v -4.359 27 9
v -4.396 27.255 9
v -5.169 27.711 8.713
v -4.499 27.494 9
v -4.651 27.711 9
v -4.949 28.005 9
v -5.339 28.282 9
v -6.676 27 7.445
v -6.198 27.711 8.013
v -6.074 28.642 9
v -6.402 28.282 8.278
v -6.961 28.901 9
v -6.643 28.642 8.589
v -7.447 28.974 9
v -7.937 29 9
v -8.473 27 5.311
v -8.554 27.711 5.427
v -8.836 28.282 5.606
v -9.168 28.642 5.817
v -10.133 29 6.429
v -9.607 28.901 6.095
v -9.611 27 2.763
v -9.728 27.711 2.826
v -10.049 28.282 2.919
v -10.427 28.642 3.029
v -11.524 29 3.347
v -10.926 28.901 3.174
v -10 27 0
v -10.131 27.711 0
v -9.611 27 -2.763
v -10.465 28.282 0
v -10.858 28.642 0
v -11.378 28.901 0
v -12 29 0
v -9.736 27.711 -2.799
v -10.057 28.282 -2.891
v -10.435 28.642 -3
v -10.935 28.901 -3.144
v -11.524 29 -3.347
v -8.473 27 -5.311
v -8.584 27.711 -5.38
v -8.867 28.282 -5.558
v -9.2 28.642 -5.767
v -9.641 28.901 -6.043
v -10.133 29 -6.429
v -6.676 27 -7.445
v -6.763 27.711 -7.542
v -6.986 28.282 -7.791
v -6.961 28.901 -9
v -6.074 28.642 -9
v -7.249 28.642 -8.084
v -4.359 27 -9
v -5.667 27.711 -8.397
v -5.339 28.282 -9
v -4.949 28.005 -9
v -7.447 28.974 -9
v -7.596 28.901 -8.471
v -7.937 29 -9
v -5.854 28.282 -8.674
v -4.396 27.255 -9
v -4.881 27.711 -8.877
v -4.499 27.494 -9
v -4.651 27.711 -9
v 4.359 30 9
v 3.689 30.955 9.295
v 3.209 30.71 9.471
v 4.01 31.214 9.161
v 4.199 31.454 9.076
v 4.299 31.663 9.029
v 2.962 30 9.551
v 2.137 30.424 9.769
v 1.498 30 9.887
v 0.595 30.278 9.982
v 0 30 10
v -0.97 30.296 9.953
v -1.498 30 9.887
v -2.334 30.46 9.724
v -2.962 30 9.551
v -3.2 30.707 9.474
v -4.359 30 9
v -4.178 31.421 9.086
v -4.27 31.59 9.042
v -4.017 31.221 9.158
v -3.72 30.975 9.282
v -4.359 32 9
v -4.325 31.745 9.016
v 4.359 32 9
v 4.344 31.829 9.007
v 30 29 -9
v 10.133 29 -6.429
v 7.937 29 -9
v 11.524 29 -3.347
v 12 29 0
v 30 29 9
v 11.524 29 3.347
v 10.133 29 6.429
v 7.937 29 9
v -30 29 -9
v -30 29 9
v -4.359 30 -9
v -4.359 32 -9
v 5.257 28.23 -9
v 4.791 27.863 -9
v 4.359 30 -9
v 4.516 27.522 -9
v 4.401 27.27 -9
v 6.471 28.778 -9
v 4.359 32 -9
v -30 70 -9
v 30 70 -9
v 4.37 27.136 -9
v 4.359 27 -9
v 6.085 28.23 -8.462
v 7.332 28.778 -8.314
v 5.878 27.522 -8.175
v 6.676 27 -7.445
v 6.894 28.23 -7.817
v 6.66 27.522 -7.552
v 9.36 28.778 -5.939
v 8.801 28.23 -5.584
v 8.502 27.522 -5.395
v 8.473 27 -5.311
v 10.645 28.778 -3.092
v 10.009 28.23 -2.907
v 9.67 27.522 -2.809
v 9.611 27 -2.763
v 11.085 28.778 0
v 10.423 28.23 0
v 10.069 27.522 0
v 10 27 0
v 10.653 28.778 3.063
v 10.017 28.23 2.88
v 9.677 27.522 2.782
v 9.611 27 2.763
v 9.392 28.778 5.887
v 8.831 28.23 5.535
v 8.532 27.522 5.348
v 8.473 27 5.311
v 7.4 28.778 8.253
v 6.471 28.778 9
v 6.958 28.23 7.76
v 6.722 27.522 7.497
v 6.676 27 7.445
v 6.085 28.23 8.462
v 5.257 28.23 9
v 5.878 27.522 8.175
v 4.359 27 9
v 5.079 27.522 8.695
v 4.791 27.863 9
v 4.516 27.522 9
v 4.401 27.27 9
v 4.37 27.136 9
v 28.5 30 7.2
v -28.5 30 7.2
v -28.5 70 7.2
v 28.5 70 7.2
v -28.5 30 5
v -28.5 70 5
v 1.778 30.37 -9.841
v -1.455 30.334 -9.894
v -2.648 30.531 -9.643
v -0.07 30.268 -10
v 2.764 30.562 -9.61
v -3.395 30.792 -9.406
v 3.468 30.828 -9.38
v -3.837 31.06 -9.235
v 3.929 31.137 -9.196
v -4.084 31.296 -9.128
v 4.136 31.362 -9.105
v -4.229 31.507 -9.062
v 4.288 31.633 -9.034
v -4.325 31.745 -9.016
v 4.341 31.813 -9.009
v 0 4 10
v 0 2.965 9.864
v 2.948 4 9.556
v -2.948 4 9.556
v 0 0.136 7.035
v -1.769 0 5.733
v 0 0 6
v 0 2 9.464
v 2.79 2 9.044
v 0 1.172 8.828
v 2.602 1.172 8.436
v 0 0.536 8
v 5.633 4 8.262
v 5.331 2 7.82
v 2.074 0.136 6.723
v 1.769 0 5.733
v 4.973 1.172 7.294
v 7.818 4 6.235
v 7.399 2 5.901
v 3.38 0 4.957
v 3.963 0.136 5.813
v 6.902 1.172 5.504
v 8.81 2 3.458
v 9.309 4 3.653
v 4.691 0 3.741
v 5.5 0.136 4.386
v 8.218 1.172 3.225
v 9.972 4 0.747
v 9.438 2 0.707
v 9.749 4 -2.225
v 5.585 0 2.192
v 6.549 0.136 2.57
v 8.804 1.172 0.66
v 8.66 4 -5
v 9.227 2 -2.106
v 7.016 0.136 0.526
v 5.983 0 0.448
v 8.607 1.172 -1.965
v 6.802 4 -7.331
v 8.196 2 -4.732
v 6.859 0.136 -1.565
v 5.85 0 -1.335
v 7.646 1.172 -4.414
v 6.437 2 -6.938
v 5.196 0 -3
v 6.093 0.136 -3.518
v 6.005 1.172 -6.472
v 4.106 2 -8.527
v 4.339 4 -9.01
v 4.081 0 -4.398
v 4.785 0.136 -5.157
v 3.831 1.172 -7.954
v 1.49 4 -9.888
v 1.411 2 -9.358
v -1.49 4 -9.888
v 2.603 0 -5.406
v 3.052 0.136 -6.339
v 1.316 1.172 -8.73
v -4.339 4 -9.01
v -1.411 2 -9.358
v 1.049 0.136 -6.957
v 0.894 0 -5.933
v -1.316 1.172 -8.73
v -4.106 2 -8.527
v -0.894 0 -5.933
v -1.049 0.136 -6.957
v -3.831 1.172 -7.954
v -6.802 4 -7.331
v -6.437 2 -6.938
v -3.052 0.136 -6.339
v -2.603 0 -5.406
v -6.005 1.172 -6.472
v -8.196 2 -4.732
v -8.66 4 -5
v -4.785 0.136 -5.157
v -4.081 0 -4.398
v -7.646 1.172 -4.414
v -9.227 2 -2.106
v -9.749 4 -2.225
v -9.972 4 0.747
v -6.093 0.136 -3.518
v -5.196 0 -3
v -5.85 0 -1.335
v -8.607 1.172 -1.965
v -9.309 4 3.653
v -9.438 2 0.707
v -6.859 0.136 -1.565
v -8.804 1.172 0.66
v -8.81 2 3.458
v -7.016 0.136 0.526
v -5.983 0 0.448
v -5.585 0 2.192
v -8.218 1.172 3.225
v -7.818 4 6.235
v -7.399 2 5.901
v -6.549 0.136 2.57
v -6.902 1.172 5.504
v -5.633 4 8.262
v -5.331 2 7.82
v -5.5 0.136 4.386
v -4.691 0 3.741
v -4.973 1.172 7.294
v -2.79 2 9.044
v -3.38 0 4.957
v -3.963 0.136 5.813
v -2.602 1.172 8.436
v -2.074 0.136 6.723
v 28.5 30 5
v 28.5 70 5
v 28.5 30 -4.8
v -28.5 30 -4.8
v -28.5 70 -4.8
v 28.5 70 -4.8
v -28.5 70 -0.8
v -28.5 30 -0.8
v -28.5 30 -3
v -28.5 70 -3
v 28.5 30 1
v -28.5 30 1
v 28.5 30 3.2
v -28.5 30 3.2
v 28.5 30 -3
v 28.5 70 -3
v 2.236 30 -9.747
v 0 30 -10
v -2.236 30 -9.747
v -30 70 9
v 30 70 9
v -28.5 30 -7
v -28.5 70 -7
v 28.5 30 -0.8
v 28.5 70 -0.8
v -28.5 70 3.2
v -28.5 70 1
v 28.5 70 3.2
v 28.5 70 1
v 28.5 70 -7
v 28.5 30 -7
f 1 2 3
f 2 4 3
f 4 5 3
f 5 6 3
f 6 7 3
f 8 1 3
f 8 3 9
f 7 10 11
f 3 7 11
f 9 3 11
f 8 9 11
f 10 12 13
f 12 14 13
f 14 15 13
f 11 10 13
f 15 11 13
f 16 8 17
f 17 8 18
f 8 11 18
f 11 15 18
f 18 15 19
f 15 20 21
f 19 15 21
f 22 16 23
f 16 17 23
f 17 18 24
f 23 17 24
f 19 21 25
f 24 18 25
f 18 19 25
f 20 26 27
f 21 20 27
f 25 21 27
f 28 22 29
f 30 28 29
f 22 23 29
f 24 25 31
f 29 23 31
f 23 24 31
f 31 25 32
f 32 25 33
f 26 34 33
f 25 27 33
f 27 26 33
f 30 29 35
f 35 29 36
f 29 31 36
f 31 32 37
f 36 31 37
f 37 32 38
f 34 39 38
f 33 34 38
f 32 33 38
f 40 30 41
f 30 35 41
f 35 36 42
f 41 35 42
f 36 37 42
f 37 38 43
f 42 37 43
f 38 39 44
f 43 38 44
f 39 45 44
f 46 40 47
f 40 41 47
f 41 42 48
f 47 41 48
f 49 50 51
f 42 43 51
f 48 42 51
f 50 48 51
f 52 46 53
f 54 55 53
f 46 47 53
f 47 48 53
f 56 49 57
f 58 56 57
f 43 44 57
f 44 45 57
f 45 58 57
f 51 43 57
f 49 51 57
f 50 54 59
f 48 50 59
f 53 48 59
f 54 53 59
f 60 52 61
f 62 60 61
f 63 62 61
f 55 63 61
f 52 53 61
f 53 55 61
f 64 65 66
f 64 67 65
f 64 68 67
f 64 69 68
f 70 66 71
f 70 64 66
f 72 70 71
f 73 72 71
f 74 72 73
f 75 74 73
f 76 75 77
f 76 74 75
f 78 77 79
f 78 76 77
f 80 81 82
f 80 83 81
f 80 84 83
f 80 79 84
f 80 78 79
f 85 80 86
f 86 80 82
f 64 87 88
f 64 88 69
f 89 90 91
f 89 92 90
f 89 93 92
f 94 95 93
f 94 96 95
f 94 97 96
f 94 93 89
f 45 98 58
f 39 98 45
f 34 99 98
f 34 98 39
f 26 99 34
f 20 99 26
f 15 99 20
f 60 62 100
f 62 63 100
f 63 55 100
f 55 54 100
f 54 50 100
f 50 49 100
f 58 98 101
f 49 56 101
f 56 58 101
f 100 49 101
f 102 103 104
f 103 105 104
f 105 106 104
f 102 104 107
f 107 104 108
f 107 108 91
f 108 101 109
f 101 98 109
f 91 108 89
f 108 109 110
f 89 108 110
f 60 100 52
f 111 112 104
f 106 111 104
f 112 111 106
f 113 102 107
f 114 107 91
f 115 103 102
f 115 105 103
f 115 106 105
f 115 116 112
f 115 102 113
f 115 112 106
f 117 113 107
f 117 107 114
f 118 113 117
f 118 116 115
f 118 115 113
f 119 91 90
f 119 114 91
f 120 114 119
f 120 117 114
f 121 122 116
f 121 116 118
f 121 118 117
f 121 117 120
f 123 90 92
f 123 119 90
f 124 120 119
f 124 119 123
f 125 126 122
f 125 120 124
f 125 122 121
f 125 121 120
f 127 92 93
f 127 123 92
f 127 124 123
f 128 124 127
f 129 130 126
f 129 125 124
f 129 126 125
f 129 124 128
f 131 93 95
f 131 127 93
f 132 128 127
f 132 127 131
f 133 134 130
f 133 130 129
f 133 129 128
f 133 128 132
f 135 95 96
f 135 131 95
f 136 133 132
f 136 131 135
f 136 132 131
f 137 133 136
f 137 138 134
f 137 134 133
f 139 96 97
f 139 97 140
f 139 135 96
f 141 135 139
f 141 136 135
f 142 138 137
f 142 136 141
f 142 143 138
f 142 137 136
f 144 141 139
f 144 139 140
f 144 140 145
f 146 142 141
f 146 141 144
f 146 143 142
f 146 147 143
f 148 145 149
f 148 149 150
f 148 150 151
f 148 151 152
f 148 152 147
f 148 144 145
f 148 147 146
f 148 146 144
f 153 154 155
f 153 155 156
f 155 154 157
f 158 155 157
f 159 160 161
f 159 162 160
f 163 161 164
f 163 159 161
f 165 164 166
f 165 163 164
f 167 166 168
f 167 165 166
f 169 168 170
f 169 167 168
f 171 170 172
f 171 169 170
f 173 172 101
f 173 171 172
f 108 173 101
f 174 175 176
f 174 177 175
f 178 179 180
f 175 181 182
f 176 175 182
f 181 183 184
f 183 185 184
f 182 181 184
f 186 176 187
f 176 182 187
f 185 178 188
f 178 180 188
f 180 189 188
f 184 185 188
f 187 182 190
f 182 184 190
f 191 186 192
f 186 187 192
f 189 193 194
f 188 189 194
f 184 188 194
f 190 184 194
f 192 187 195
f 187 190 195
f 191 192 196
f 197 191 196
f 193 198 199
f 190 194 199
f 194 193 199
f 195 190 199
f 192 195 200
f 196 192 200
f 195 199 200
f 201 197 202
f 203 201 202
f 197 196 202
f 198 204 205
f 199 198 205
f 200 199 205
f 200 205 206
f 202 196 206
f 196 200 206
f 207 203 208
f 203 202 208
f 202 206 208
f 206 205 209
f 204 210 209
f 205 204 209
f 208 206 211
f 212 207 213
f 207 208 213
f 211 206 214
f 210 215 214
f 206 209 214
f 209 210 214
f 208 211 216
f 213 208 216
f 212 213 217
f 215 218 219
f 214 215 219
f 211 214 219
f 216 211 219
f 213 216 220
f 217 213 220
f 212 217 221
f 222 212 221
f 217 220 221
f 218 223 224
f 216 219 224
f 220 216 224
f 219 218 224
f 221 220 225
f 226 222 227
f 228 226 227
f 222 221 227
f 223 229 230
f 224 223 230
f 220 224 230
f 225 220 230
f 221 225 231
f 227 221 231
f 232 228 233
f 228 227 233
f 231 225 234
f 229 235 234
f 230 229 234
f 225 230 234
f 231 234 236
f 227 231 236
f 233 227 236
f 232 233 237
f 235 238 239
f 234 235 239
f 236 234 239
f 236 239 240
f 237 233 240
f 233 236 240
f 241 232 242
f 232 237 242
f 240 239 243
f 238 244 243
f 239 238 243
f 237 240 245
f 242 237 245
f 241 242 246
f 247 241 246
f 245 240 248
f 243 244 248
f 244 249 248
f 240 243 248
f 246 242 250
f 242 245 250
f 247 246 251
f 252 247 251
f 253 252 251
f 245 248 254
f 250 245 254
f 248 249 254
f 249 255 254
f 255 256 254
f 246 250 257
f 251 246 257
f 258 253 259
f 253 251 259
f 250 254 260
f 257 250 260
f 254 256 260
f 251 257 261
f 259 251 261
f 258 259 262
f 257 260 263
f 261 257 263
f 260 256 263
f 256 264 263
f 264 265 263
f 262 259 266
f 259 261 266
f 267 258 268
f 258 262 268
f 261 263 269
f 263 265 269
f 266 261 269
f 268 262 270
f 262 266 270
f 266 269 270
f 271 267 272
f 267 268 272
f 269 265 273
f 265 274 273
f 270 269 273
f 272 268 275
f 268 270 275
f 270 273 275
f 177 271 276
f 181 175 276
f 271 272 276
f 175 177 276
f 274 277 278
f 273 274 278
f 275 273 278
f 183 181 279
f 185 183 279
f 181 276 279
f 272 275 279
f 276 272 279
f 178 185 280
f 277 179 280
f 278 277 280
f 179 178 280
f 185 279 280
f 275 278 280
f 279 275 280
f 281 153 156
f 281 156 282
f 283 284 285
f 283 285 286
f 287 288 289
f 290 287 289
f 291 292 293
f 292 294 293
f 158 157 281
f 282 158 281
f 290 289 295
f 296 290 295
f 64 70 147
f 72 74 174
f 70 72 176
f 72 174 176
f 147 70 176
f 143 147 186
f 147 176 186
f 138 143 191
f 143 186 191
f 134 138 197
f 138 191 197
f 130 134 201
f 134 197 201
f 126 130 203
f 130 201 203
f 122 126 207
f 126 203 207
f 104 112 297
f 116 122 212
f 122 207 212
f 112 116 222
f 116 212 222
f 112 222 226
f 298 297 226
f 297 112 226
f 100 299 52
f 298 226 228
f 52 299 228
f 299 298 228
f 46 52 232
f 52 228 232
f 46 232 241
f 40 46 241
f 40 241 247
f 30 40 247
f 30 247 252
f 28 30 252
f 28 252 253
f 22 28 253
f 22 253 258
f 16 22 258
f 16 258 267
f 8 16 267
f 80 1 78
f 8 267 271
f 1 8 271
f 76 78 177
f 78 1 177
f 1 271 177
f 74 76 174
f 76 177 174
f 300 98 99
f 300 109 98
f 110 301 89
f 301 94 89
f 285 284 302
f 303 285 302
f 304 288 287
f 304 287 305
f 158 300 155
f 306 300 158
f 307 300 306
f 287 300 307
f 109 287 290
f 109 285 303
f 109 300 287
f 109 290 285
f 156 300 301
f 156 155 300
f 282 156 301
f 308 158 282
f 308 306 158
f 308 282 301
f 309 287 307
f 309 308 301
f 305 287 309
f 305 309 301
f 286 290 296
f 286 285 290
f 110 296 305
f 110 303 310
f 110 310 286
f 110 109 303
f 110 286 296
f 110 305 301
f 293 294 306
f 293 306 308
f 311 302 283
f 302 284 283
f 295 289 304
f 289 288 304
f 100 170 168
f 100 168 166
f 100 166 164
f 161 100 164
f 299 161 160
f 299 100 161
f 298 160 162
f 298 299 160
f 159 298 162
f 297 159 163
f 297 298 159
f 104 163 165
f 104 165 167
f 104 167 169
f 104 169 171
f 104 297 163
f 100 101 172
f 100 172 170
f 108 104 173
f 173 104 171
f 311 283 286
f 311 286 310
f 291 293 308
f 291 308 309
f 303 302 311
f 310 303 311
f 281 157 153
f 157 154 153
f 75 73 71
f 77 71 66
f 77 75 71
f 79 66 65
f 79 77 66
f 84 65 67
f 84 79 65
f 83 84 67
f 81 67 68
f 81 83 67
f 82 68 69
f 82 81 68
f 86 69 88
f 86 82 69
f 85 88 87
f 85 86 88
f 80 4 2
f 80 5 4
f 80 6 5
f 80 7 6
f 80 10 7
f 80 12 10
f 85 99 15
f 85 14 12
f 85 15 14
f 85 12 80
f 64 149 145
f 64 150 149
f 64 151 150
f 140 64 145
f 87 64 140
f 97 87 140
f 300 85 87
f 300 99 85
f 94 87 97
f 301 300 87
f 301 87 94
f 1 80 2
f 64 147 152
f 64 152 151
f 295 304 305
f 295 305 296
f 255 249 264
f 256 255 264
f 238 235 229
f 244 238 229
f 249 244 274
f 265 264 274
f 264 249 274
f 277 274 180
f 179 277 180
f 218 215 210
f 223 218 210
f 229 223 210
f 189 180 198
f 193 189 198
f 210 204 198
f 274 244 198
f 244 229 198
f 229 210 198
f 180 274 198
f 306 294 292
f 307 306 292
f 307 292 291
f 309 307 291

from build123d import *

# Parameters (mm, degrees)
SKETCH1_R           = 10
BOSS_EXTRUDE1_DEPTH = 30
FILLET1_R           = 4
SKETCH2_W           = 60
SKETCH2_H           = 18
SKETCH2_W_2         = 57
SKETCH2_H_2         = 2.2
BOSS_EXTRUDE2_DEPTH = 40
SKETCH3_W           = 60
SKETCH3_H           = 18
BOSS_EXTRUDE3_DEPTH = 1
FILLET2_R           = 2
FILLET3_R           = 2


with BuildPart() as part:
    # Sketch1 → Boss-Extrude1 (new body)
    with BuildSketch(Plane(origin=(0, 0, 0), x_dir=(1, 0, 0), z_dir=(0, 1, 0))):
        with Locations(Location((0, 0, 0), (0, 0, 270))):
            Circle(SKETCH1_R)
    extrude(amount=BOSS_EXTRUDE1_DEPTH)

    # Fillet1
    fillet1_edges = [part.edges().sort_by_distance(p)[0] for p in [
        (0, 0, -10),
    ]]
    fillet(fillet1_edges, radius=FILLET1_R)

    # Sketch2 → Boss-Extrude2 (add)
    with BuildSketch(Plane(origin=(0, 30, 0), x_dir=(1, 0, 0), z_dir=(0, 1, 0))):
        Rectangle(SKETCH2_W, SKETCH2_H)
        with Locations((0, 1.9)):
            Rectangle(SKETCH2_W_2, SKETCH2_H_2, mode=Mode.SUBTRACT)
        with Locations((0, 5.9)):
            Rectangle(SKETCH2_W_2, SKETCH2_H_2, mode=Mode.SUBTRACT)
        with Locations((0, -2.1)):
            Rectangle(SKETCH2_W_2, SKETCH2_H_2, mode=Mode.SUBTRACT)
        with Locations((0, -6.1)):
            Rectangle(SKETCH2_W_2, SKETCH2_H_2, mode=Mode.SUBTRACT)
    extrude(amount=BOSS_EXTRUDE2_DEPTH)

    # Sketch3 → Boss-Extrude3 (add)
    with BuildSketch(Plane.XZ.offset(-30)):
        Rectangle(SKETCH3_W, SKETCH3_H)
    extrude(amount=BOSS_EXTRUDE3_DEPTH)

    # Fillet2
    fillet2_edges = [part.edges().sort_by_distance(p)[0] for p in [
        (-10, 29, 0),
        (10, 29, 0),
    ]]
    fillet(fillet2_edges, radius=FILLET2_R)

    # Fillet3
    # the kernel refuses this fillet: 2 mm, written as the material it adds along each edge
    with BuildSketch(Plane(origin=(-9.358898944, 30, 9), x_dir=(0, 0, 1), z_dir=(1, 0, 0))) as fillet3_piece_1_section:
        with BuildLine():
            CenterArc((FILLET3_R, -FILLET3_R), FILLET3_R, 90, 90)
            Line((0, -FILLET3_R), (0, 0))
            Line((0, 0), (FILLET3_R, 0))
        make_face()
    fillet3_piece_1 = extrude(amount=18.717797887, mode=Mode.PRIVATE)
    fillet3_piece_1 = fillet3_piece_1 & Plane(origin=(0, 30.566631584, 0), x_dir=(0, 0, 1), z_dir=(0, -1, 0)) * Cylinder(10, 46, mode=Mode.PRIVATE)
    add(fillet3_piece_1)
    with BuildSketch(Plane(origin=(9.358898944, 30, -9), x_dir=(0, 0, -1), z_dir=(-1, 0, 0))) as fillet3_piece_2_section:
        with BuildLine():
            CenterArc((FILLET3_R, -FILLET3_R), FILLET3_R, 90, 90)
            Line((0, -FILLET3_R), (0, 0))
            Line((0, 0), (FILLET3_R, 0))
        make_face()
    fillet3_piece_2 = extrude(amount=18.717797887, mode=Mode.PRIVATE)
    fillet3_piece_2 = fillet3_piece_2 & Plane(origin=(0, 30.566641093, 0), x_dir=(0, 0, 1), z_dir=(0, -1, 0)) * Cylinder(10, 46, mode=Mode.PRIVATE)
    add(fillet3_piece_2)


solid = part.part
